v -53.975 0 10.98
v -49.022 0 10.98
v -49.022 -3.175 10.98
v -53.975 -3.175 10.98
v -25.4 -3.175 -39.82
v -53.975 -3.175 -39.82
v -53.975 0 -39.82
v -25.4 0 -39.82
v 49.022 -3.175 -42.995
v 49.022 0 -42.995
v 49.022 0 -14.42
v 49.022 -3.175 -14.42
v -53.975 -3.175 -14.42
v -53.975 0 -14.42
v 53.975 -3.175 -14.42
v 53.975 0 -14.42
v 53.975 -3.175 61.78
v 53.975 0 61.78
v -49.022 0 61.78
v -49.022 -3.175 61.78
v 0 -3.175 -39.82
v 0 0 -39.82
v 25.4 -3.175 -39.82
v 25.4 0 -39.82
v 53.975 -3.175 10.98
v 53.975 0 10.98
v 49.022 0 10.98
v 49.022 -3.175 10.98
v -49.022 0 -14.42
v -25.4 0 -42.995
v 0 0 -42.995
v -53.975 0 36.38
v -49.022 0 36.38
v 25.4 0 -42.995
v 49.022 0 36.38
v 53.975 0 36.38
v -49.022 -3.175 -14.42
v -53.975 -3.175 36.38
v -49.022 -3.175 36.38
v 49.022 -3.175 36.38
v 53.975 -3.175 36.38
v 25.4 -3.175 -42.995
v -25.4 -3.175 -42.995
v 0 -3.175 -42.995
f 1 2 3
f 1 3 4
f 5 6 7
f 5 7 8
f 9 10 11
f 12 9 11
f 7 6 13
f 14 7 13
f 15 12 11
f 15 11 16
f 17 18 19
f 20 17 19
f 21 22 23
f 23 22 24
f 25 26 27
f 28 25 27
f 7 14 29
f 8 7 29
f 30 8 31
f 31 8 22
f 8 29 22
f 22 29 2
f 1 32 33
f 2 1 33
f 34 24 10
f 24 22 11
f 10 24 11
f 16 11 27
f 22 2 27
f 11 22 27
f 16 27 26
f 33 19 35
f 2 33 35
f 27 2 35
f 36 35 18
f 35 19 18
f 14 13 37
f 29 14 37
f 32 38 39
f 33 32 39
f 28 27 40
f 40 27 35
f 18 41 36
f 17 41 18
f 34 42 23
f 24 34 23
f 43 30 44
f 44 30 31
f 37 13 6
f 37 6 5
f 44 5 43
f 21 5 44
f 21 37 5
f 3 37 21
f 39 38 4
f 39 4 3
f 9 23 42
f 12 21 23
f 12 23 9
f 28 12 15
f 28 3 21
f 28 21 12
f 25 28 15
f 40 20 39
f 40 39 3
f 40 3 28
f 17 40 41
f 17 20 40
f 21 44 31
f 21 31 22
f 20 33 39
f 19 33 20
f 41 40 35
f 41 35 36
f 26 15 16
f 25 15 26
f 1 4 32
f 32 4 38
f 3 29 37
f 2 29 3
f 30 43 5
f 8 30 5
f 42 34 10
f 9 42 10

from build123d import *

# Parameters (mm, degrees)
F0_W     = 25.4
F0_H     = 3.175
F1_DEPTH = 3.175
F2_W     = 3.175
F2_H     = 25.4
F3_DEPTH = 3.175
F4_W     = 1.778
F4_H     = 25.4
F4_H_2   = 28.575
F5_DEPTH = 3.175


with BuildPart() as f1:
    # F0 (on Front) → F1 (new body)
    with BuildSketch(Plane.XZ):
        Polygon((25.4, -39.8197), (50.8, -39.8197), (50.8, 61.7803), (-50.8, 61.7803), (-50.8, -39.8197), (-25.4, -39.8197), (0, -39.8197), align=None)
        with Locations((-12.7, -41.4072)):
            Rectangle(F0_W, F0_H)
        with Locations((38.1, -41.4072)):
            Rectangle(F0_W, F0_H)
    extrude(amount=F1_DEPTH)

    # F2 (on face) → F3 (join)
    with BuildSketch(Plane.XZ.offset(3.175)):
        with Locations((-52.3875, 23.6803)):
            Rectangle(F2_W, F2_H)
        with Locations((-52.3875, -27.1197)):
            Rectangle(F2_W, F2_H)
        with Locations((52.3875, 49.0803)):
            Rectangle(F2_W, F2_H)
        with Locations((52.3875, -1.7197)):
            Rectangle(F2_W, F2_H)
    extrude(amount=-F3_DEPTH)

    # F4 (on face) → F5 (cut)
    with BuildSketch(Plane(origin=(0, 0, 0), x_dir=(-1, 0, 0), z_dir=(0, 1, 0))):
        with Locations((-49.911, 23.6803)):
            Rectangle(F4_W, F4_H)
        with Locations((49.911, 49.0803)):
            Rectangle(F4_W, F4_H)
        with Locations((49.911, -1.7197)):
            Rectangle(F4_W, F4_H)
        with Locations((-49.911, -28.7072)):
            Rectangle(F4_W, F4_H_2)
    extrude(amount=-F5_DEPTH, mode=Mode.SUBTRACT)


solid = f1.part
